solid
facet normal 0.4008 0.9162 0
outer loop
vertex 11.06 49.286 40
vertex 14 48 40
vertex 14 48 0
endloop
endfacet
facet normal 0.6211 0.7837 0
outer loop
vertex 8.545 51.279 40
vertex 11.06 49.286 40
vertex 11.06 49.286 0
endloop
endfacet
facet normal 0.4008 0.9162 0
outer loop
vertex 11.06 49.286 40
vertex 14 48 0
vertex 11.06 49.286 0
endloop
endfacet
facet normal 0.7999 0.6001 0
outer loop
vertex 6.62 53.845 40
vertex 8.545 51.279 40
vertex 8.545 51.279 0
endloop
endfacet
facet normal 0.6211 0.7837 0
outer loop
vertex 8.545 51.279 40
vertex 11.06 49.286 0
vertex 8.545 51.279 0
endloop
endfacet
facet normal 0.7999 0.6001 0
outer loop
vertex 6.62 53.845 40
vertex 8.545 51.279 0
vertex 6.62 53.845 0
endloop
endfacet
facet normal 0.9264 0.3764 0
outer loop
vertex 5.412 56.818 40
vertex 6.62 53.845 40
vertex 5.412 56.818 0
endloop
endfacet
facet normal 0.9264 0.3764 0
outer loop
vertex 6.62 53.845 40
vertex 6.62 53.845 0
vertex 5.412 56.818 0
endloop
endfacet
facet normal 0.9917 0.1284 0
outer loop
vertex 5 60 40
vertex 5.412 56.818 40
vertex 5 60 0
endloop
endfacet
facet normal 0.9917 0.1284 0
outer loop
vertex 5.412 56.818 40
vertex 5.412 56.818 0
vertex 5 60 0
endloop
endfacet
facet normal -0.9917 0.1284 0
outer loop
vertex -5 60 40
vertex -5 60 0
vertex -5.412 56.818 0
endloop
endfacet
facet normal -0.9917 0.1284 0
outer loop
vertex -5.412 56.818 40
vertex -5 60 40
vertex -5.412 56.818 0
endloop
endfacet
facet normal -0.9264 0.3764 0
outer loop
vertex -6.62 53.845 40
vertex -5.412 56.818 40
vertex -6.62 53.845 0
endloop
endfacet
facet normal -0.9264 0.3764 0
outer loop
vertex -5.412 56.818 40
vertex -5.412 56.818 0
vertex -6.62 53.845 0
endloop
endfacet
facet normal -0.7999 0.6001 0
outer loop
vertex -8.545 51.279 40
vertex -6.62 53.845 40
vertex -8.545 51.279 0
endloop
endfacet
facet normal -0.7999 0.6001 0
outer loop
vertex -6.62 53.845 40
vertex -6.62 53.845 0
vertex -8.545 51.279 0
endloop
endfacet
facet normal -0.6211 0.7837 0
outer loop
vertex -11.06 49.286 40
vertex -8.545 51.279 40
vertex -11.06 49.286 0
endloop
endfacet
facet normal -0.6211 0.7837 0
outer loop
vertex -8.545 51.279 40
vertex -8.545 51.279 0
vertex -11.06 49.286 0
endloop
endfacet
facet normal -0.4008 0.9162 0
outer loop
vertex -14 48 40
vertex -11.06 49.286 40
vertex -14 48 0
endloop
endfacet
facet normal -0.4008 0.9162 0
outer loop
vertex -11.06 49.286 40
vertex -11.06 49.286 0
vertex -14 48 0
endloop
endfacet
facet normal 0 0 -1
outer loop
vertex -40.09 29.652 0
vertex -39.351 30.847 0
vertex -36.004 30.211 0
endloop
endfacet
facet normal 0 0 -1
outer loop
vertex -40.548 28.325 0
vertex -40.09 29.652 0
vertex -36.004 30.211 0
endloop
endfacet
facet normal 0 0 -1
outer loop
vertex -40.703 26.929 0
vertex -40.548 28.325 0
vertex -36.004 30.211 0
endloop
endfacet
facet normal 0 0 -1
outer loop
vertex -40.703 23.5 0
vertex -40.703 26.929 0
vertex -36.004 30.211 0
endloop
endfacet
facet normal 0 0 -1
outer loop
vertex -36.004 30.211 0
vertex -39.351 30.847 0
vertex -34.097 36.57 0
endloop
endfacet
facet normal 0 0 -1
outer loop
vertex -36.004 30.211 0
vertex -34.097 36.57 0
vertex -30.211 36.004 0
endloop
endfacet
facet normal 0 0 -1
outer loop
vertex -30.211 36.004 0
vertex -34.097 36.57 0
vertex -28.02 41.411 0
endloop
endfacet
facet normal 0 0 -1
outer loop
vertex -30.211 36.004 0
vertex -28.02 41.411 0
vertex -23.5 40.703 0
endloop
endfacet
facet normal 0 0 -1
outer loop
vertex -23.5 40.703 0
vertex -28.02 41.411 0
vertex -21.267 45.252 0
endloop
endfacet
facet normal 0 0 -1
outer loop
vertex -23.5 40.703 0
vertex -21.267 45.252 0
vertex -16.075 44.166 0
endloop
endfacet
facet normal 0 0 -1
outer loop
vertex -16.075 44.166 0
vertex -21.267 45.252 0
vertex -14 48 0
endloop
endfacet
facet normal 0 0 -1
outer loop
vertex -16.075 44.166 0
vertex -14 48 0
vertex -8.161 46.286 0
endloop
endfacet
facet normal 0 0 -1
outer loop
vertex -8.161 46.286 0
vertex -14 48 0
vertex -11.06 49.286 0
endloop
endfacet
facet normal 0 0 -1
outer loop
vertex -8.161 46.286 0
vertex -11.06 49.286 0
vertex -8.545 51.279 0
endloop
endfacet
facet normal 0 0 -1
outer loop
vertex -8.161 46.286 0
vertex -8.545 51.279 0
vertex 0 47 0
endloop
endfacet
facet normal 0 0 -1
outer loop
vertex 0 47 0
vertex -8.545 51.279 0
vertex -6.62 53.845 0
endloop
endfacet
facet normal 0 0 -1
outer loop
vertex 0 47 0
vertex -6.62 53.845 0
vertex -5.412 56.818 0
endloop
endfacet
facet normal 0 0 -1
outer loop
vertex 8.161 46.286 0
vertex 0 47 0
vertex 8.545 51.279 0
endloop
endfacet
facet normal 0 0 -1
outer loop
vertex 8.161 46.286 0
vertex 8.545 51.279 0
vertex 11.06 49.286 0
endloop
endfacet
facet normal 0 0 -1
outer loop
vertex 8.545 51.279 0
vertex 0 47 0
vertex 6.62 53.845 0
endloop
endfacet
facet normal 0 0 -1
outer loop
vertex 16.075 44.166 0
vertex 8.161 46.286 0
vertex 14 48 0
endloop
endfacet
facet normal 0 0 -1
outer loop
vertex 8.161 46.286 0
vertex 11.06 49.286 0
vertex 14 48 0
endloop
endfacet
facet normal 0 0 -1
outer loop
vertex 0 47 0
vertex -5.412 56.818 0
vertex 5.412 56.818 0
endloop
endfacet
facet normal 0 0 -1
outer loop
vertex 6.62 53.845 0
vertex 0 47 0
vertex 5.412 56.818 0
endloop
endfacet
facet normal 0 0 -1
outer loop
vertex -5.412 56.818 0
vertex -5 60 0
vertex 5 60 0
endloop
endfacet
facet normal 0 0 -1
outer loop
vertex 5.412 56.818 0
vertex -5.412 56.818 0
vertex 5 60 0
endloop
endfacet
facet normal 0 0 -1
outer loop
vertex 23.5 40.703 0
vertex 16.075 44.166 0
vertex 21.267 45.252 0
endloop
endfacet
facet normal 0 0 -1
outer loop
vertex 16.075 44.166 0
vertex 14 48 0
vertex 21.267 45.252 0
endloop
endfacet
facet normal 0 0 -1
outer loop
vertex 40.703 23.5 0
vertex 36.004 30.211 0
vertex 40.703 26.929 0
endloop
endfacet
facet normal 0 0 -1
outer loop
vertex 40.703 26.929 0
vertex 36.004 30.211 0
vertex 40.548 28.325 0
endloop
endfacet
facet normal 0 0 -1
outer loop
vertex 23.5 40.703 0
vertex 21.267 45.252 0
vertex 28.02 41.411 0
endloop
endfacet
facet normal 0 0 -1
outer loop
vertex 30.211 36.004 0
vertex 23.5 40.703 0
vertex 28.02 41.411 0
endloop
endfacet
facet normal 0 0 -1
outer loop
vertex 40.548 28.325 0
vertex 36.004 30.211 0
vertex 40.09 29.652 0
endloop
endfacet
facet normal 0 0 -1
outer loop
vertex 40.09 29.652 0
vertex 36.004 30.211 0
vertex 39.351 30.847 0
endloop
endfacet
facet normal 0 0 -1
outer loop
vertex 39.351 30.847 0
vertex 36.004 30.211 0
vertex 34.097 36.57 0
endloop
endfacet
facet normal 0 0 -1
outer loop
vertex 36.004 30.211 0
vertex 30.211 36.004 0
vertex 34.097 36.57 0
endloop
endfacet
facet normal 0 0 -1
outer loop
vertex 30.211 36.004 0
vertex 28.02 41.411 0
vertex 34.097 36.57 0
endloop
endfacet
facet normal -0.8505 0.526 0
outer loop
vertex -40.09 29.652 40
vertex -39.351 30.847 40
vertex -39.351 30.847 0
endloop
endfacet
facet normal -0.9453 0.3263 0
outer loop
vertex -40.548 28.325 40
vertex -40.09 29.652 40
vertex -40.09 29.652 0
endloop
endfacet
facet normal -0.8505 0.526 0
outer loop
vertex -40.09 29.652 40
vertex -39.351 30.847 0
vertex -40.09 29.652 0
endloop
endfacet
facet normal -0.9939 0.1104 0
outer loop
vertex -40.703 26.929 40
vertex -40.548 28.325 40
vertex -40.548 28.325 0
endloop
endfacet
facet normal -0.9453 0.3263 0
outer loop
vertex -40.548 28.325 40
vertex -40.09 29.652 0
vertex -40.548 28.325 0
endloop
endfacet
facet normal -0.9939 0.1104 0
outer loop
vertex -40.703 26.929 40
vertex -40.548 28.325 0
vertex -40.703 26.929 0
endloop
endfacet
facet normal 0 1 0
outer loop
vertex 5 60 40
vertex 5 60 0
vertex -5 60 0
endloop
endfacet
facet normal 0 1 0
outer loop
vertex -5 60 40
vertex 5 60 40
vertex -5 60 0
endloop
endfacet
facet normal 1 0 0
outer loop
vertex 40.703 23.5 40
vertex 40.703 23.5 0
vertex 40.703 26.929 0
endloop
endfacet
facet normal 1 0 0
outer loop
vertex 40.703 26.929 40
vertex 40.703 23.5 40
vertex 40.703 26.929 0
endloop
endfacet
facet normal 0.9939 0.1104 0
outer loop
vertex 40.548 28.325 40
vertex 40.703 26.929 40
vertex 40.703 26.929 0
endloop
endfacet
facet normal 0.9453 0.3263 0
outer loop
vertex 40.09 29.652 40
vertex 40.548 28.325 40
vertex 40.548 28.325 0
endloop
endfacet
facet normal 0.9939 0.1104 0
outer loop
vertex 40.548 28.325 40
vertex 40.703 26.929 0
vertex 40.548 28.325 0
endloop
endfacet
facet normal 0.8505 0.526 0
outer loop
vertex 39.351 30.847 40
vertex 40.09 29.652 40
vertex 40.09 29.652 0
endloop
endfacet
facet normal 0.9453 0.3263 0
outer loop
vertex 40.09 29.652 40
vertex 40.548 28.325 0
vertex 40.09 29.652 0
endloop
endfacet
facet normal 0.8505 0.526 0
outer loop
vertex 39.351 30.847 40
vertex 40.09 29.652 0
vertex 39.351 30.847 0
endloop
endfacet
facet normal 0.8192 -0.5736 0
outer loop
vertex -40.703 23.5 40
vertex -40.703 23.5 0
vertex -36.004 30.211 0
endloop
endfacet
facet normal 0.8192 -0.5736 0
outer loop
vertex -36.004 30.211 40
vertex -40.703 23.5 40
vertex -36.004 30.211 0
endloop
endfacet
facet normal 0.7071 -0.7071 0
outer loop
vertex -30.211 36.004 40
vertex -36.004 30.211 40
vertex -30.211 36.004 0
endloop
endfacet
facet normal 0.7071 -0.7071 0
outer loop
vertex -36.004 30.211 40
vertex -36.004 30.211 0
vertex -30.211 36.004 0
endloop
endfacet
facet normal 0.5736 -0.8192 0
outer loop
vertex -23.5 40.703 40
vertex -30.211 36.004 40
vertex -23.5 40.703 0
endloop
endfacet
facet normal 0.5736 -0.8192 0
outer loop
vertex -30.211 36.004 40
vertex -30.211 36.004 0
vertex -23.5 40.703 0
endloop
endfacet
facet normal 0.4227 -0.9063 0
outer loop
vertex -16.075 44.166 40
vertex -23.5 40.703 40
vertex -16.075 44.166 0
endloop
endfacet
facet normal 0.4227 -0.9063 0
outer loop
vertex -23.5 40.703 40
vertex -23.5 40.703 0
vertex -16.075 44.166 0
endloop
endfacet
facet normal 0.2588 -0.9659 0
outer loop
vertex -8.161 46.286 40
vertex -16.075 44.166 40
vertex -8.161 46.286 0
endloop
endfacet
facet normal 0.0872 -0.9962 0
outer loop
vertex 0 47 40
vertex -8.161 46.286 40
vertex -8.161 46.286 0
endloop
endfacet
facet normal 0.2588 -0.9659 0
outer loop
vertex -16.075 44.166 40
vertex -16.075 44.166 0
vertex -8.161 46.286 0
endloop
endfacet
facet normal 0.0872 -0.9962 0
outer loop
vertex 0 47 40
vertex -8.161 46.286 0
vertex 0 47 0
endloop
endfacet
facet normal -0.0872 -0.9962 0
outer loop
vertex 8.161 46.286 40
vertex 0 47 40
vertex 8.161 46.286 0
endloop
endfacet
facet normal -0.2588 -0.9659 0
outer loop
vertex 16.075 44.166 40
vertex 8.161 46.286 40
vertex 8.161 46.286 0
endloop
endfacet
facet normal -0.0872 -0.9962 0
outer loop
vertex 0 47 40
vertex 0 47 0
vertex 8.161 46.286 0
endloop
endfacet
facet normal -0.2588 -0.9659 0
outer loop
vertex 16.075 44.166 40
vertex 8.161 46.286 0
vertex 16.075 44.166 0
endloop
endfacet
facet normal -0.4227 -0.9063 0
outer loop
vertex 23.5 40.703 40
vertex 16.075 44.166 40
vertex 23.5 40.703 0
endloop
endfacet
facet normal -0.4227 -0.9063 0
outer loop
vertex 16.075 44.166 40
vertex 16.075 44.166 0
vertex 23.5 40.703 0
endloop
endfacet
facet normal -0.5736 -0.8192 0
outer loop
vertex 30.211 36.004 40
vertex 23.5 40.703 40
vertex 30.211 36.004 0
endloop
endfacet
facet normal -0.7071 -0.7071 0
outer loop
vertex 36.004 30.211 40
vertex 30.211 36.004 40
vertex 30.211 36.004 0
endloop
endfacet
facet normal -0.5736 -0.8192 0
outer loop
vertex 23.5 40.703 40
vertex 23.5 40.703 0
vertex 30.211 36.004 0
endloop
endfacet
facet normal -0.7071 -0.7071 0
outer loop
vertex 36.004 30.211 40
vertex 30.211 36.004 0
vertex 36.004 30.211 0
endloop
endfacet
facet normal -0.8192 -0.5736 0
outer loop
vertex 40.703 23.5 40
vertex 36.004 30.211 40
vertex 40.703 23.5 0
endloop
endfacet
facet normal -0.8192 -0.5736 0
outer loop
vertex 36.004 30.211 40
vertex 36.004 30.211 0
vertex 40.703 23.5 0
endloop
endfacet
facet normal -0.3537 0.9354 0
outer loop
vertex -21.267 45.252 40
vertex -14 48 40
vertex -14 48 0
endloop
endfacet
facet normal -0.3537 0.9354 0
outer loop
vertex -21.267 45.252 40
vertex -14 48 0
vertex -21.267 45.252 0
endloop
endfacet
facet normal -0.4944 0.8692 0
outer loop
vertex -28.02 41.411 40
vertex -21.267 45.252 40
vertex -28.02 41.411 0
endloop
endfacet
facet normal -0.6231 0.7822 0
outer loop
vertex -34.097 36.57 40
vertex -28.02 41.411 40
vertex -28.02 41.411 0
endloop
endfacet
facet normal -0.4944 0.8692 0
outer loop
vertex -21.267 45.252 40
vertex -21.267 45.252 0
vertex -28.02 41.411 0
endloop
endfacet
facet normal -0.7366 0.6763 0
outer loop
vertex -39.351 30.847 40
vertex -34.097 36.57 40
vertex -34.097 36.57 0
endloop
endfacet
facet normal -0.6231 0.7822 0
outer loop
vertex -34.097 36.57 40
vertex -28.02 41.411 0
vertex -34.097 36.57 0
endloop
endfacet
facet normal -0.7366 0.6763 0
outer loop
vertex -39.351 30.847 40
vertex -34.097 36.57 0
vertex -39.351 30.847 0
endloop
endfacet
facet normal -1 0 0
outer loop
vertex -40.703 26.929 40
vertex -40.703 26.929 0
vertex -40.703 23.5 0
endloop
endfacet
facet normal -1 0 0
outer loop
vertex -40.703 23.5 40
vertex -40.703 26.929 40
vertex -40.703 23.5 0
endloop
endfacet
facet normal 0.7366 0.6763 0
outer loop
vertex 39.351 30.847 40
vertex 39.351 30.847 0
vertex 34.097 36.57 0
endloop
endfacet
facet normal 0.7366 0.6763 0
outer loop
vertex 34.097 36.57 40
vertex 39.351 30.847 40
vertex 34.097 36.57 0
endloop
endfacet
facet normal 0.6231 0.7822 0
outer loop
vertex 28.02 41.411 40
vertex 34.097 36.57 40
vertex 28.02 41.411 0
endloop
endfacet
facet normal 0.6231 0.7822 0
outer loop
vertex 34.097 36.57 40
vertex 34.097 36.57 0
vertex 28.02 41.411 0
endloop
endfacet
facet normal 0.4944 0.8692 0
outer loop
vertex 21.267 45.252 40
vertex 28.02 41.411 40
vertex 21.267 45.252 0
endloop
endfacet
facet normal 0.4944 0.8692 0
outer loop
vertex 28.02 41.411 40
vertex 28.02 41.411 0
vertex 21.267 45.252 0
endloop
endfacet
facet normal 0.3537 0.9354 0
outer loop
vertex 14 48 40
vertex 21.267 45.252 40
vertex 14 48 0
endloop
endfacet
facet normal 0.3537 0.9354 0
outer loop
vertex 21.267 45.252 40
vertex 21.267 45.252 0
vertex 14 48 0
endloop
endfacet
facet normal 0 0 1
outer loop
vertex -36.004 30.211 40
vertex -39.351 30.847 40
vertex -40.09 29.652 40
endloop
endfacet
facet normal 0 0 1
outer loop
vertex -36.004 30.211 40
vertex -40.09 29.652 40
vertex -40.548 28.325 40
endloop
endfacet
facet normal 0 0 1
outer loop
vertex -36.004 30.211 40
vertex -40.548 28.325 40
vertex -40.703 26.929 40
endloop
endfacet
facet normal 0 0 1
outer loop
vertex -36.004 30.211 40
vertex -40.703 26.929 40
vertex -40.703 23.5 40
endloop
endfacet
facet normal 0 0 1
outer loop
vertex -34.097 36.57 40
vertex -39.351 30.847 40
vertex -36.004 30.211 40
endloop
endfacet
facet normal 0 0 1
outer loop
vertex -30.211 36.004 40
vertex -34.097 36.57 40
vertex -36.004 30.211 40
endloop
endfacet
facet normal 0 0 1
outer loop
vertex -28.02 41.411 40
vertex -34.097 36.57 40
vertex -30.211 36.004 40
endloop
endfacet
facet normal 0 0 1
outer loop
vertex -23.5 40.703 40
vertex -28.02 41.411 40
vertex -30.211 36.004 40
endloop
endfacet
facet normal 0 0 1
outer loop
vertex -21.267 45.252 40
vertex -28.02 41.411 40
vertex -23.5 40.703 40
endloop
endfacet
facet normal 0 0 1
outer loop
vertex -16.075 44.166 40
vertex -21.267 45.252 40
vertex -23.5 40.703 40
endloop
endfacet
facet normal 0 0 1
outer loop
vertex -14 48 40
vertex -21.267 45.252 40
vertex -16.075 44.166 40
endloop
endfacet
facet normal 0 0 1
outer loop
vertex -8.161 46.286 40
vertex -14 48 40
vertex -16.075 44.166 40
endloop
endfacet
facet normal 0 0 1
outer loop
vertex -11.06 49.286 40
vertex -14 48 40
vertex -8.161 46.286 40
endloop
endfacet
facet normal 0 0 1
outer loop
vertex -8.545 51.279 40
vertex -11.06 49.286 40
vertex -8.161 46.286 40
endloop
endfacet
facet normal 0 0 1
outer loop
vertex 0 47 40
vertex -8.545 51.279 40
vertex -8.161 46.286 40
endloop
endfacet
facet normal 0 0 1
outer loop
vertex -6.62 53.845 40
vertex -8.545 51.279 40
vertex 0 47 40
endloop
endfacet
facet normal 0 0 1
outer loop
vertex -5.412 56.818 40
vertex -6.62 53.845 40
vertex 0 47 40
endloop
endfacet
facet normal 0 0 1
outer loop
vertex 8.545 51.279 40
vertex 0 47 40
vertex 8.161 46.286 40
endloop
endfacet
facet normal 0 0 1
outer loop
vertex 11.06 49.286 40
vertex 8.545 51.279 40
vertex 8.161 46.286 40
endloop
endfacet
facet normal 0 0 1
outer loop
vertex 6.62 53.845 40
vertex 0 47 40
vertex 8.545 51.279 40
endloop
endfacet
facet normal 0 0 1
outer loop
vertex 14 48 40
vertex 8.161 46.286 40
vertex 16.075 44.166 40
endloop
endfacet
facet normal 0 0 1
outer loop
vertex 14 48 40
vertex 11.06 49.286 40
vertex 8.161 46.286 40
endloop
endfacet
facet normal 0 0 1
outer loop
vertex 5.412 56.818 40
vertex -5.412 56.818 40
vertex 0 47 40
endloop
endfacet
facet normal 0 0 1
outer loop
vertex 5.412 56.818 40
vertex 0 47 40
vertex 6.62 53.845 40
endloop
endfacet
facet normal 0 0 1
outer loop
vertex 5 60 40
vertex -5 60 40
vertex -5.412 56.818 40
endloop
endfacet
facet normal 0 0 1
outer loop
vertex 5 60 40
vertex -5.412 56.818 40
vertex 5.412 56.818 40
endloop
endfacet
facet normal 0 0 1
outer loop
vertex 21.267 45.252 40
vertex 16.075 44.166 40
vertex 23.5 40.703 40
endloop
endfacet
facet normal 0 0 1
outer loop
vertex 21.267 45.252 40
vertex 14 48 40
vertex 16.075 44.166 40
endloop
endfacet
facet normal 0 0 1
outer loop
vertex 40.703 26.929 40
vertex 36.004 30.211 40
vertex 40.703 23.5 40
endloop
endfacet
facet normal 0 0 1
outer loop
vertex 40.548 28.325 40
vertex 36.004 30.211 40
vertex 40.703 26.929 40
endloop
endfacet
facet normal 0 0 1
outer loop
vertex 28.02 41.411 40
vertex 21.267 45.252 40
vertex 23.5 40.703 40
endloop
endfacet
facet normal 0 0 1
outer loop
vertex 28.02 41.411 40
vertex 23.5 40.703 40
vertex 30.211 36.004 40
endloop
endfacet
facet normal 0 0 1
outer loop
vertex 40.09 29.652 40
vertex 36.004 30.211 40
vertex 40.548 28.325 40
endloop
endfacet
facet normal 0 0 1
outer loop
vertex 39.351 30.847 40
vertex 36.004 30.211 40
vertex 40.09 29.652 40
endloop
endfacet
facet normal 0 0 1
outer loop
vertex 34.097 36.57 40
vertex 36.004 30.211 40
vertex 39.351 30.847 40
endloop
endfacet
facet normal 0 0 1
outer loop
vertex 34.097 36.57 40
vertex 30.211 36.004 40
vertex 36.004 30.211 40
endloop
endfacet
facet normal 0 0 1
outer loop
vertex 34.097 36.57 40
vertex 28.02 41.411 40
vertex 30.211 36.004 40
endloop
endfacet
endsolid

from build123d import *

# Parameters (mm, degrees)
F1_DEPTH = 40


with BuildPart() as f1:
    # F0 (on Top) → F1 (new body)
    with BuildSketch(Plane.XY):
        with BuildLine():
            ThreePointArc((-5, 49.749372), (0, 50), (5, 49.749372))
            Line((5, 49.749372), (5, 60))
            Line((5, 60), (-5, 60))
            Line((-5, 60), (-5, 49.749372))
        make_face()
        with BuildLine():
            ThreePointArc((-14, 48), (-9.540182, 49.081411), (-5, 49.749372))
            Line((-5, 49.749372), (-5, 60))
            ThreePointArc((-5, 60), (-7.5, 52.5), (-14, 48))
        make_face()
        with BuildLine():
            ThreePointArc((5, 49.749372), (9.540182, 49.081411), (14, 48))
            ThreePointArc((14, 48), (7.5, 52.5), (5, 60))
            Line((5, 60), (5, 49.749372))
        make_face()
        with BuildLine():
            ThreePointArc((40.703194, 26.929177), (40.355564, 29.001385), (39.350738, 30.846709))
            ThreePointArc((39.350738, 30.846709), (28.020245, 41.410939), (14, 48))
            ThreePointArc((14, 48), (9.540182, 49.081411), (5, 49.749372))
            Line((5, 49.749372), (-5, 49.749372))
            ThreePointArc((-5, 49.749372), (-9.540182, 49.081411), (-14, 48))
            ThreePointArc((-14, 48), (-28.020245, 41.410939), (-39.350738, 30.846709))
            ThreePointArc((-39.350738, 30.846709), (-40.355564, 29.001385), (-40.703194, 26.929177))
            Line((-40.703194, 26.929177), (-40.703194, 23.5))
            ThreePointArc((-40.703194, 23.5), (0, 47), (40.703194, 23.5))
            Line((40.703194, 23.5), (40.703194, 26.929177))
        make_face()
        with BuildLine():
            Line((-5, 49.749372), (5, 49.749372))
            ThreePointArc((5, 49.749372), (0, 50), (-5, 49.749372))
        make_face()
    extrude(amount=F1_DEPTH)


solid = f1.part
